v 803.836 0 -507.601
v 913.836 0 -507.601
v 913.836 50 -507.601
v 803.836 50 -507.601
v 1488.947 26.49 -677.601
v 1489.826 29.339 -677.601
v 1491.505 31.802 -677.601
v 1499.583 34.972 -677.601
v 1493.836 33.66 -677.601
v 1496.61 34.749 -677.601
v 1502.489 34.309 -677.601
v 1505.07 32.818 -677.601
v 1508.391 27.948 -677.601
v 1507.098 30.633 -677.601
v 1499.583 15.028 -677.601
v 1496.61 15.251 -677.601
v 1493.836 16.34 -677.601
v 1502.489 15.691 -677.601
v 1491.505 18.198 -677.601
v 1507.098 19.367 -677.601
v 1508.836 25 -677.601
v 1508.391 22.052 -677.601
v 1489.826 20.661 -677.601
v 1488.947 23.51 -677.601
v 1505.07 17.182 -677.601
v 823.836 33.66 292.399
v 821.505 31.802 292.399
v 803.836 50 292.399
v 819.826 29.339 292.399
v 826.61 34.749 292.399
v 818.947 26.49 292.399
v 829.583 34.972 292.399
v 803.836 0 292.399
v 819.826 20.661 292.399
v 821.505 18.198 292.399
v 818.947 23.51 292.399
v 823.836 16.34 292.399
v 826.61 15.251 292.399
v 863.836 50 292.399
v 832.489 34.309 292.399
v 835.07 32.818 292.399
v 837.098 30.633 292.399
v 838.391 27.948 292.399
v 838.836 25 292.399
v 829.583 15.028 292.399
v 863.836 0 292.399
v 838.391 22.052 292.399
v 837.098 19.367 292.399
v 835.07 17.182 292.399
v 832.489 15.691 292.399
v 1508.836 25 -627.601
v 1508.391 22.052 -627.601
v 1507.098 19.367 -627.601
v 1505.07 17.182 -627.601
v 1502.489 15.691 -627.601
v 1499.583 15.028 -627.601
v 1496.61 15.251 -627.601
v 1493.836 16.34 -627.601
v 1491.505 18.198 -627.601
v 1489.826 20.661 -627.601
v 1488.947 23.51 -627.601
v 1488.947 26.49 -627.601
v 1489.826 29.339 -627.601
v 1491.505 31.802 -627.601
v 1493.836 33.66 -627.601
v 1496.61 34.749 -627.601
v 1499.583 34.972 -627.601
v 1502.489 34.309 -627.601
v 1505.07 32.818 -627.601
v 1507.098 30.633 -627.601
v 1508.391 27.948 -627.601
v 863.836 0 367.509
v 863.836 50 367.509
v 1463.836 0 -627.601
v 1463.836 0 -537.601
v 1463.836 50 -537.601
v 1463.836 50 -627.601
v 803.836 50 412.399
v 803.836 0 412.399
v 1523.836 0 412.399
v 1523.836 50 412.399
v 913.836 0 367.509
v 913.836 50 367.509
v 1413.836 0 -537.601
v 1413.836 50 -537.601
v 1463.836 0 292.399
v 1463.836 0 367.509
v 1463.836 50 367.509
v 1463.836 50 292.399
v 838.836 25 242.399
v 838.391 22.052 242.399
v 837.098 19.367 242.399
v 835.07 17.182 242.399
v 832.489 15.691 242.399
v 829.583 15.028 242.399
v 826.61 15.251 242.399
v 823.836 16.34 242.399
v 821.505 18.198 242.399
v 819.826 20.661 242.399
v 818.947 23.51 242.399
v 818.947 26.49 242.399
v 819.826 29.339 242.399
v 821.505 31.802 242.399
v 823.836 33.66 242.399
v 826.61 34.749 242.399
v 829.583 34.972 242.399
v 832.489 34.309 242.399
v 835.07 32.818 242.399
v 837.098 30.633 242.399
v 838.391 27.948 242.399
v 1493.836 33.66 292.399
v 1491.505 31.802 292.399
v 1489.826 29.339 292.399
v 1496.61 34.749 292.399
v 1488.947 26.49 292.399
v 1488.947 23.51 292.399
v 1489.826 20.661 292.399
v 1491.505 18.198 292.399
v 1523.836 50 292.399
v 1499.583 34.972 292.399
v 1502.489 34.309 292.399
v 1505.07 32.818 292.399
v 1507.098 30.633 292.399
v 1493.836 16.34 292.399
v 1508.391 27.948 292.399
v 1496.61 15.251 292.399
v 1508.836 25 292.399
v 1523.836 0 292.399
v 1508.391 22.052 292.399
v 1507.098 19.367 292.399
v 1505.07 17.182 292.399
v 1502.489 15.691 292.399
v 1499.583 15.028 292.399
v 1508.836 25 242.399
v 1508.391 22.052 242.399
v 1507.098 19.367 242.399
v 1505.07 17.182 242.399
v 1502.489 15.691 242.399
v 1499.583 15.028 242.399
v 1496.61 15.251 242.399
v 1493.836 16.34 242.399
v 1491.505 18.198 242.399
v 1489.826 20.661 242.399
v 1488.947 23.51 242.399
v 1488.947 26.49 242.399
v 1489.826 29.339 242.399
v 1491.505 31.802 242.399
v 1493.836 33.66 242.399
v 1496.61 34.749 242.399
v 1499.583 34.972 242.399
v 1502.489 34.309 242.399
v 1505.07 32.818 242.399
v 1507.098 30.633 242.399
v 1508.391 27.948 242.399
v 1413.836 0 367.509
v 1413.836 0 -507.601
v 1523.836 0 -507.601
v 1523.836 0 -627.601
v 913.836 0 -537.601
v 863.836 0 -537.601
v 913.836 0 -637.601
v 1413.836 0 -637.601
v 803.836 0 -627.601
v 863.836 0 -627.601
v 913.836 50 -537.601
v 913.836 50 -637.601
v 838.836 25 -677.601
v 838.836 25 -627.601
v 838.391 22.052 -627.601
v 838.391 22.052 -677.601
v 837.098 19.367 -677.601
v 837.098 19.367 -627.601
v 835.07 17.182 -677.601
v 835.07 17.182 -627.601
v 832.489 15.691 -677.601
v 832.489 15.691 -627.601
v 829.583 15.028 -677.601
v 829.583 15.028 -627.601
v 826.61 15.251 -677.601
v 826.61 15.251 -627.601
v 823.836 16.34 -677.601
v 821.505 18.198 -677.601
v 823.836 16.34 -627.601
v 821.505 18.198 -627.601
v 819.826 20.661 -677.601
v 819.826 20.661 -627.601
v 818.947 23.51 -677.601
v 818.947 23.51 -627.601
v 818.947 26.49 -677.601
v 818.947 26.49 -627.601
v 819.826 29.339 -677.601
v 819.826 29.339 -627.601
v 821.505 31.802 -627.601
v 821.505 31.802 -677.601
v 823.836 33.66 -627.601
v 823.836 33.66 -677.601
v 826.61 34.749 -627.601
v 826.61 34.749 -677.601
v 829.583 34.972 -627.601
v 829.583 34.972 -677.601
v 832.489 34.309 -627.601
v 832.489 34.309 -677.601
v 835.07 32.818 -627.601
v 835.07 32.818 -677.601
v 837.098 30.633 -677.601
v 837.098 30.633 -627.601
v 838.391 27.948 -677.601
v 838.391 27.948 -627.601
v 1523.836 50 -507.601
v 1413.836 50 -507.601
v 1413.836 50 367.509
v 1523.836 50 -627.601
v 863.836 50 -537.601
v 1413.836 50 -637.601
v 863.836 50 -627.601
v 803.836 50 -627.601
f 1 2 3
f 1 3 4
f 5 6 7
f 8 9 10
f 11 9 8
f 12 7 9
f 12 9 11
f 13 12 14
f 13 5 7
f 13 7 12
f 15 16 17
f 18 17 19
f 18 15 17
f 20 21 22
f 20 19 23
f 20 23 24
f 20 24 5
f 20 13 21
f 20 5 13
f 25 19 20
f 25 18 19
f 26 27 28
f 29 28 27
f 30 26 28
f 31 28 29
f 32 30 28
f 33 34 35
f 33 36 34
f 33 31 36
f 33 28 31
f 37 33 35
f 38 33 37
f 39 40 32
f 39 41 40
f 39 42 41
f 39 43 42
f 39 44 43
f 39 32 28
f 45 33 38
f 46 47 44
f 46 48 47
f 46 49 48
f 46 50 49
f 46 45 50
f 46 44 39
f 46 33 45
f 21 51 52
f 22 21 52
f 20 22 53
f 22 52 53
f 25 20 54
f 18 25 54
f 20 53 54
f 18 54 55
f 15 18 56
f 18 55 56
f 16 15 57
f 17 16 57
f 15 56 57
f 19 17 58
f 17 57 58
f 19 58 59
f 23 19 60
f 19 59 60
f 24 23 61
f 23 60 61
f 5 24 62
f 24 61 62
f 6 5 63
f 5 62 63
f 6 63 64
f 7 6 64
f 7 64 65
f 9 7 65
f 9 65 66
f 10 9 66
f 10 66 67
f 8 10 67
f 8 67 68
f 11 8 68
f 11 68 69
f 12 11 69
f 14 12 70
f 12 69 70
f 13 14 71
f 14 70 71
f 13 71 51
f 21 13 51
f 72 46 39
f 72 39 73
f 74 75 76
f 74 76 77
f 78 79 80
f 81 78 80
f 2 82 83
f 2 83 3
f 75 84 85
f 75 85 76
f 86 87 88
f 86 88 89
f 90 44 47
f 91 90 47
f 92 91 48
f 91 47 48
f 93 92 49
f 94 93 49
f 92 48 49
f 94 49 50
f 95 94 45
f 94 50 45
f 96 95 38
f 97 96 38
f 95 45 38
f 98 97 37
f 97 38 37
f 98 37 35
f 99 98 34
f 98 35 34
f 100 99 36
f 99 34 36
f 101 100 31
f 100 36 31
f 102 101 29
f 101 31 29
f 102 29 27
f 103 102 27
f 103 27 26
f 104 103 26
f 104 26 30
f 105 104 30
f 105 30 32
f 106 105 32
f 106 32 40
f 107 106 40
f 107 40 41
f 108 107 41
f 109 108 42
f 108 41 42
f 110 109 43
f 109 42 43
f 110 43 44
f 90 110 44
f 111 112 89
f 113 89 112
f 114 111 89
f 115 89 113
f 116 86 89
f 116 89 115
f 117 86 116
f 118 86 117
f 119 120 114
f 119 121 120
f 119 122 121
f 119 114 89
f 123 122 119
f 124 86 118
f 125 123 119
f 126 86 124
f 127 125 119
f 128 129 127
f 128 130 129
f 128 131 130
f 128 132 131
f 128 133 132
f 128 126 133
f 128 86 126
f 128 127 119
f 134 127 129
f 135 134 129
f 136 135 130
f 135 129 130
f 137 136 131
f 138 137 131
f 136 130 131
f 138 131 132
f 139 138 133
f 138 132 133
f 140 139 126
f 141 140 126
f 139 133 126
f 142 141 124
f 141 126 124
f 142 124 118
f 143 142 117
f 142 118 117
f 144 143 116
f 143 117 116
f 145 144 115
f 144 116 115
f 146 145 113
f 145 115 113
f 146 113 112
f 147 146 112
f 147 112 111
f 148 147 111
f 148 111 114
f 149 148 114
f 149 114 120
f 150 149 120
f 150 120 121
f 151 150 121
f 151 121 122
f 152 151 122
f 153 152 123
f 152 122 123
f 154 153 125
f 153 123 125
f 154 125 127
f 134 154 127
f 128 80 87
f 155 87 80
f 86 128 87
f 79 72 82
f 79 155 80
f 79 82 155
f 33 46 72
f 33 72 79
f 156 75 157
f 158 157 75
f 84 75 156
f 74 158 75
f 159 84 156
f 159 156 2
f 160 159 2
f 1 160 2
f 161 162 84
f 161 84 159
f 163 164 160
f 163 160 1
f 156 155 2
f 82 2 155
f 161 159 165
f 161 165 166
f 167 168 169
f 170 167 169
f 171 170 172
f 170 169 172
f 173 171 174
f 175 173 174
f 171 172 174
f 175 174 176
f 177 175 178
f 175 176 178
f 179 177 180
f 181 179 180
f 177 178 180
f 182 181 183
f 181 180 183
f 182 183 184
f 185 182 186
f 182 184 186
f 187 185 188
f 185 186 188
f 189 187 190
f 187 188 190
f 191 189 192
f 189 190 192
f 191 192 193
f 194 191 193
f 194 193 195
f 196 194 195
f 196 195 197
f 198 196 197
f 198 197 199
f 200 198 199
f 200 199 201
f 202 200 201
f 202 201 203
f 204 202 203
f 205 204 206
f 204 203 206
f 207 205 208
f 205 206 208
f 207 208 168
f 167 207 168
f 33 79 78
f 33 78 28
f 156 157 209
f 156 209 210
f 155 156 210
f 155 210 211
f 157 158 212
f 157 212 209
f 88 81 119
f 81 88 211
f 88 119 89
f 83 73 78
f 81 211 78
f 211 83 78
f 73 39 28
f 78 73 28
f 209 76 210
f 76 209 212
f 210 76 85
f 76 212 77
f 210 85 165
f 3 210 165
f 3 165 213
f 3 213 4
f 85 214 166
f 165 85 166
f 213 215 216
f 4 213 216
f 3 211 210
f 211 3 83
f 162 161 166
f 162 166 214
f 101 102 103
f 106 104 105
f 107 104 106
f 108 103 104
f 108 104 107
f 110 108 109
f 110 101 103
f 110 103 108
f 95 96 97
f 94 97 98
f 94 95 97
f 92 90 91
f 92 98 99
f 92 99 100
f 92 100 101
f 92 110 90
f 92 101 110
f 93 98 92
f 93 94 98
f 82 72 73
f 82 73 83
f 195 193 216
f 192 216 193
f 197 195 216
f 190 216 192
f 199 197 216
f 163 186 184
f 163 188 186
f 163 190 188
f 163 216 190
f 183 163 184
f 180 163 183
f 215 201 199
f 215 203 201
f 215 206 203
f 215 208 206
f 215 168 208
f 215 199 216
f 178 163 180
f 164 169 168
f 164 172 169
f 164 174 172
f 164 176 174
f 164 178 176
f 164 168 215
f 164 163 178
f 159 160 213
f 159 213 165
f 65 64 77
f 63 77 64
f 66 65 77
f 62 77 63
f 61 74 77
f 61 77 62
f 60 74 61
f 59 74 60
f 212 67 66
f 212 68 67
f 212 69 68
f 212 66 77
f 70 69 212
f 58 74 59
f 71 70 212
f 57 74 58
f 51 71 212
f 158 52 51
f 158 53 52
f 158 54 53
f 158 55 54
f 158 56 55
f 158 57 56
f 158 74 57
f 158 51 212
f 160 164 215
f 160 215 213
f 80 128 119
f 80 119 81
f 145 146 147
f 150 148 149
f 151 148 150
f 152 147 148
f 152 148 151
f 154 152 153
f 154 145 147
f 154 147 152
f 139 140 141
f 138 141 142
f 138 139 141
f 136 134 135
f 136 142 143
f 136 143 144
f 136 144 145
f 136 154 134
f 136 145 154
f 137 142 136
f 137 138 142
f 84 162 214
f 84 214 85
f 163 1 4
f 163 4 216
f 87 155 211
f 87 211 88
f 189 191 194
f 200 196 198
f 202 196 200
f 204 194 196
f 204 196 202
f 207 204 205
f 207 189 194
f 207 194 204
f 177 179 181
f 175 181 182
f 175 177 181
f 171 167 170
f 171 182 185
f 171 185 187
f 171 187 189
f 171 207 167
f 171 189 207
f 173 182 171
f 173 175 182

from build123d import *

# Parameters (mm, degrees)
BOSS_EXTRUDE1_DEPTH = 50
SKETCH2_R           = 10
BOSS_EXTRUDE2_DEPTH = 50
SKETCH3_R           = 10
BOSS_EXTRUDE3_DEPTH = 50
SKETCH4_R           = 10
BOSS_EXTRUDE4_DEPTH = 50
SKETCH5_R           = 10
BOSS_EXTRUDE5_DEPTH = 50


with BuildPart() as part:
    # Sketch1 → Boss-Extrude1 (new body)
    with BuildSketch(Plane(origin=(0, 0, 0), x_dir=(1, 0, 0), z_dir=(0, 1, 0))):
        Polygon((1413.835542094, 637.601174935), (1413.835542094, 537.601174935), (1463.835542094, 537.601174935), (1463.835542094, 627.601174935), (1523.835542094, 627.601174935), (1523.835542094, 507.601174935), (1413.835542094, 507.601174935), (1413.835542094, -367.509476585), (1463.835542094, -367.509476585), (1463.835542094, -292.398825065), (1523.835542094, -292.398825065), (1523.835542094, -412.398825065), (1413.835542094, -412.398825065), (913.835542094, -412.398825065), (803.835542094, -412.398825065), (803.835542094, -292.398825065), (863.835542094, -292.398825065), (863.835542094, -367.509476585), (913.835542094, -367.509476585), (913.835542094, 507.601174935), (803.835542094, 507.601174935), (803.835542094, 627.601174935), (863.835542094, 627.601174935), (863.835542094, 537.601174935), (913.835542094, 537.601174935), (913.835542094, 637.601174935), align=None)
    extrude(amount=BOSS_EXTRUDE1_DEPTH)

    # Sketch2 → Boss-Extrude2 (add)
    with BuildSketch(Plane(origin=(0, 0, -627.601174935), x_dir=(-1, 0, 0), z_dir=(0, 0, -1))):
        with Locations(Location((-828.835542094, 25, 0), (0, 0, 180))):
            Circle(SKETCH2_R)
    extrude(amount=BOSS_EXTRUDE2_DEPTH)

    # Sketch3 → Boss-Extrude3 (add)
    with BuildSketch(Plane(origin=(0, 0, 292.398825065), x_dir=(-1, 0, 0), z_dir=(0, 0, -1))):
        with Locations(Location((-828.835542094, 25, 0), (0, 0, 180))):
            Circle(SKETCH3_R)
    extrude(amount=BOSS_EXTRUDE3_DEPTH)

    # Sketch4 → Boss-Extrude4 (add)
    with BuildSketch(Plane(origin=(0, 0, -627.601174935), x_dir=(-1, 0, 0), z_dir=(0, 0, -1))):
        with Locations(Location((-1498.835542094, 25, 0), (0, 0, 180))):
            Circle(SKETCH4_R)
    extrude(amount=BOSS_EXTRUDE4_DEPTH)

    # Sketch5 → Boss-Extrude5 (add)
    with BuildSketch(Plane(origin=(0, 0, 292.398825065), x_dir=(-1, 0, 0), z_dir=(0, 0, -1))):
        with Locations(Location((-1498.835542094, 25, 0), (0, 0, 180))):
            Circle(SKETCH5_R)
    extrude(amount=BOSS_EXTRUDE5_DEPTH)


solid = part.part
